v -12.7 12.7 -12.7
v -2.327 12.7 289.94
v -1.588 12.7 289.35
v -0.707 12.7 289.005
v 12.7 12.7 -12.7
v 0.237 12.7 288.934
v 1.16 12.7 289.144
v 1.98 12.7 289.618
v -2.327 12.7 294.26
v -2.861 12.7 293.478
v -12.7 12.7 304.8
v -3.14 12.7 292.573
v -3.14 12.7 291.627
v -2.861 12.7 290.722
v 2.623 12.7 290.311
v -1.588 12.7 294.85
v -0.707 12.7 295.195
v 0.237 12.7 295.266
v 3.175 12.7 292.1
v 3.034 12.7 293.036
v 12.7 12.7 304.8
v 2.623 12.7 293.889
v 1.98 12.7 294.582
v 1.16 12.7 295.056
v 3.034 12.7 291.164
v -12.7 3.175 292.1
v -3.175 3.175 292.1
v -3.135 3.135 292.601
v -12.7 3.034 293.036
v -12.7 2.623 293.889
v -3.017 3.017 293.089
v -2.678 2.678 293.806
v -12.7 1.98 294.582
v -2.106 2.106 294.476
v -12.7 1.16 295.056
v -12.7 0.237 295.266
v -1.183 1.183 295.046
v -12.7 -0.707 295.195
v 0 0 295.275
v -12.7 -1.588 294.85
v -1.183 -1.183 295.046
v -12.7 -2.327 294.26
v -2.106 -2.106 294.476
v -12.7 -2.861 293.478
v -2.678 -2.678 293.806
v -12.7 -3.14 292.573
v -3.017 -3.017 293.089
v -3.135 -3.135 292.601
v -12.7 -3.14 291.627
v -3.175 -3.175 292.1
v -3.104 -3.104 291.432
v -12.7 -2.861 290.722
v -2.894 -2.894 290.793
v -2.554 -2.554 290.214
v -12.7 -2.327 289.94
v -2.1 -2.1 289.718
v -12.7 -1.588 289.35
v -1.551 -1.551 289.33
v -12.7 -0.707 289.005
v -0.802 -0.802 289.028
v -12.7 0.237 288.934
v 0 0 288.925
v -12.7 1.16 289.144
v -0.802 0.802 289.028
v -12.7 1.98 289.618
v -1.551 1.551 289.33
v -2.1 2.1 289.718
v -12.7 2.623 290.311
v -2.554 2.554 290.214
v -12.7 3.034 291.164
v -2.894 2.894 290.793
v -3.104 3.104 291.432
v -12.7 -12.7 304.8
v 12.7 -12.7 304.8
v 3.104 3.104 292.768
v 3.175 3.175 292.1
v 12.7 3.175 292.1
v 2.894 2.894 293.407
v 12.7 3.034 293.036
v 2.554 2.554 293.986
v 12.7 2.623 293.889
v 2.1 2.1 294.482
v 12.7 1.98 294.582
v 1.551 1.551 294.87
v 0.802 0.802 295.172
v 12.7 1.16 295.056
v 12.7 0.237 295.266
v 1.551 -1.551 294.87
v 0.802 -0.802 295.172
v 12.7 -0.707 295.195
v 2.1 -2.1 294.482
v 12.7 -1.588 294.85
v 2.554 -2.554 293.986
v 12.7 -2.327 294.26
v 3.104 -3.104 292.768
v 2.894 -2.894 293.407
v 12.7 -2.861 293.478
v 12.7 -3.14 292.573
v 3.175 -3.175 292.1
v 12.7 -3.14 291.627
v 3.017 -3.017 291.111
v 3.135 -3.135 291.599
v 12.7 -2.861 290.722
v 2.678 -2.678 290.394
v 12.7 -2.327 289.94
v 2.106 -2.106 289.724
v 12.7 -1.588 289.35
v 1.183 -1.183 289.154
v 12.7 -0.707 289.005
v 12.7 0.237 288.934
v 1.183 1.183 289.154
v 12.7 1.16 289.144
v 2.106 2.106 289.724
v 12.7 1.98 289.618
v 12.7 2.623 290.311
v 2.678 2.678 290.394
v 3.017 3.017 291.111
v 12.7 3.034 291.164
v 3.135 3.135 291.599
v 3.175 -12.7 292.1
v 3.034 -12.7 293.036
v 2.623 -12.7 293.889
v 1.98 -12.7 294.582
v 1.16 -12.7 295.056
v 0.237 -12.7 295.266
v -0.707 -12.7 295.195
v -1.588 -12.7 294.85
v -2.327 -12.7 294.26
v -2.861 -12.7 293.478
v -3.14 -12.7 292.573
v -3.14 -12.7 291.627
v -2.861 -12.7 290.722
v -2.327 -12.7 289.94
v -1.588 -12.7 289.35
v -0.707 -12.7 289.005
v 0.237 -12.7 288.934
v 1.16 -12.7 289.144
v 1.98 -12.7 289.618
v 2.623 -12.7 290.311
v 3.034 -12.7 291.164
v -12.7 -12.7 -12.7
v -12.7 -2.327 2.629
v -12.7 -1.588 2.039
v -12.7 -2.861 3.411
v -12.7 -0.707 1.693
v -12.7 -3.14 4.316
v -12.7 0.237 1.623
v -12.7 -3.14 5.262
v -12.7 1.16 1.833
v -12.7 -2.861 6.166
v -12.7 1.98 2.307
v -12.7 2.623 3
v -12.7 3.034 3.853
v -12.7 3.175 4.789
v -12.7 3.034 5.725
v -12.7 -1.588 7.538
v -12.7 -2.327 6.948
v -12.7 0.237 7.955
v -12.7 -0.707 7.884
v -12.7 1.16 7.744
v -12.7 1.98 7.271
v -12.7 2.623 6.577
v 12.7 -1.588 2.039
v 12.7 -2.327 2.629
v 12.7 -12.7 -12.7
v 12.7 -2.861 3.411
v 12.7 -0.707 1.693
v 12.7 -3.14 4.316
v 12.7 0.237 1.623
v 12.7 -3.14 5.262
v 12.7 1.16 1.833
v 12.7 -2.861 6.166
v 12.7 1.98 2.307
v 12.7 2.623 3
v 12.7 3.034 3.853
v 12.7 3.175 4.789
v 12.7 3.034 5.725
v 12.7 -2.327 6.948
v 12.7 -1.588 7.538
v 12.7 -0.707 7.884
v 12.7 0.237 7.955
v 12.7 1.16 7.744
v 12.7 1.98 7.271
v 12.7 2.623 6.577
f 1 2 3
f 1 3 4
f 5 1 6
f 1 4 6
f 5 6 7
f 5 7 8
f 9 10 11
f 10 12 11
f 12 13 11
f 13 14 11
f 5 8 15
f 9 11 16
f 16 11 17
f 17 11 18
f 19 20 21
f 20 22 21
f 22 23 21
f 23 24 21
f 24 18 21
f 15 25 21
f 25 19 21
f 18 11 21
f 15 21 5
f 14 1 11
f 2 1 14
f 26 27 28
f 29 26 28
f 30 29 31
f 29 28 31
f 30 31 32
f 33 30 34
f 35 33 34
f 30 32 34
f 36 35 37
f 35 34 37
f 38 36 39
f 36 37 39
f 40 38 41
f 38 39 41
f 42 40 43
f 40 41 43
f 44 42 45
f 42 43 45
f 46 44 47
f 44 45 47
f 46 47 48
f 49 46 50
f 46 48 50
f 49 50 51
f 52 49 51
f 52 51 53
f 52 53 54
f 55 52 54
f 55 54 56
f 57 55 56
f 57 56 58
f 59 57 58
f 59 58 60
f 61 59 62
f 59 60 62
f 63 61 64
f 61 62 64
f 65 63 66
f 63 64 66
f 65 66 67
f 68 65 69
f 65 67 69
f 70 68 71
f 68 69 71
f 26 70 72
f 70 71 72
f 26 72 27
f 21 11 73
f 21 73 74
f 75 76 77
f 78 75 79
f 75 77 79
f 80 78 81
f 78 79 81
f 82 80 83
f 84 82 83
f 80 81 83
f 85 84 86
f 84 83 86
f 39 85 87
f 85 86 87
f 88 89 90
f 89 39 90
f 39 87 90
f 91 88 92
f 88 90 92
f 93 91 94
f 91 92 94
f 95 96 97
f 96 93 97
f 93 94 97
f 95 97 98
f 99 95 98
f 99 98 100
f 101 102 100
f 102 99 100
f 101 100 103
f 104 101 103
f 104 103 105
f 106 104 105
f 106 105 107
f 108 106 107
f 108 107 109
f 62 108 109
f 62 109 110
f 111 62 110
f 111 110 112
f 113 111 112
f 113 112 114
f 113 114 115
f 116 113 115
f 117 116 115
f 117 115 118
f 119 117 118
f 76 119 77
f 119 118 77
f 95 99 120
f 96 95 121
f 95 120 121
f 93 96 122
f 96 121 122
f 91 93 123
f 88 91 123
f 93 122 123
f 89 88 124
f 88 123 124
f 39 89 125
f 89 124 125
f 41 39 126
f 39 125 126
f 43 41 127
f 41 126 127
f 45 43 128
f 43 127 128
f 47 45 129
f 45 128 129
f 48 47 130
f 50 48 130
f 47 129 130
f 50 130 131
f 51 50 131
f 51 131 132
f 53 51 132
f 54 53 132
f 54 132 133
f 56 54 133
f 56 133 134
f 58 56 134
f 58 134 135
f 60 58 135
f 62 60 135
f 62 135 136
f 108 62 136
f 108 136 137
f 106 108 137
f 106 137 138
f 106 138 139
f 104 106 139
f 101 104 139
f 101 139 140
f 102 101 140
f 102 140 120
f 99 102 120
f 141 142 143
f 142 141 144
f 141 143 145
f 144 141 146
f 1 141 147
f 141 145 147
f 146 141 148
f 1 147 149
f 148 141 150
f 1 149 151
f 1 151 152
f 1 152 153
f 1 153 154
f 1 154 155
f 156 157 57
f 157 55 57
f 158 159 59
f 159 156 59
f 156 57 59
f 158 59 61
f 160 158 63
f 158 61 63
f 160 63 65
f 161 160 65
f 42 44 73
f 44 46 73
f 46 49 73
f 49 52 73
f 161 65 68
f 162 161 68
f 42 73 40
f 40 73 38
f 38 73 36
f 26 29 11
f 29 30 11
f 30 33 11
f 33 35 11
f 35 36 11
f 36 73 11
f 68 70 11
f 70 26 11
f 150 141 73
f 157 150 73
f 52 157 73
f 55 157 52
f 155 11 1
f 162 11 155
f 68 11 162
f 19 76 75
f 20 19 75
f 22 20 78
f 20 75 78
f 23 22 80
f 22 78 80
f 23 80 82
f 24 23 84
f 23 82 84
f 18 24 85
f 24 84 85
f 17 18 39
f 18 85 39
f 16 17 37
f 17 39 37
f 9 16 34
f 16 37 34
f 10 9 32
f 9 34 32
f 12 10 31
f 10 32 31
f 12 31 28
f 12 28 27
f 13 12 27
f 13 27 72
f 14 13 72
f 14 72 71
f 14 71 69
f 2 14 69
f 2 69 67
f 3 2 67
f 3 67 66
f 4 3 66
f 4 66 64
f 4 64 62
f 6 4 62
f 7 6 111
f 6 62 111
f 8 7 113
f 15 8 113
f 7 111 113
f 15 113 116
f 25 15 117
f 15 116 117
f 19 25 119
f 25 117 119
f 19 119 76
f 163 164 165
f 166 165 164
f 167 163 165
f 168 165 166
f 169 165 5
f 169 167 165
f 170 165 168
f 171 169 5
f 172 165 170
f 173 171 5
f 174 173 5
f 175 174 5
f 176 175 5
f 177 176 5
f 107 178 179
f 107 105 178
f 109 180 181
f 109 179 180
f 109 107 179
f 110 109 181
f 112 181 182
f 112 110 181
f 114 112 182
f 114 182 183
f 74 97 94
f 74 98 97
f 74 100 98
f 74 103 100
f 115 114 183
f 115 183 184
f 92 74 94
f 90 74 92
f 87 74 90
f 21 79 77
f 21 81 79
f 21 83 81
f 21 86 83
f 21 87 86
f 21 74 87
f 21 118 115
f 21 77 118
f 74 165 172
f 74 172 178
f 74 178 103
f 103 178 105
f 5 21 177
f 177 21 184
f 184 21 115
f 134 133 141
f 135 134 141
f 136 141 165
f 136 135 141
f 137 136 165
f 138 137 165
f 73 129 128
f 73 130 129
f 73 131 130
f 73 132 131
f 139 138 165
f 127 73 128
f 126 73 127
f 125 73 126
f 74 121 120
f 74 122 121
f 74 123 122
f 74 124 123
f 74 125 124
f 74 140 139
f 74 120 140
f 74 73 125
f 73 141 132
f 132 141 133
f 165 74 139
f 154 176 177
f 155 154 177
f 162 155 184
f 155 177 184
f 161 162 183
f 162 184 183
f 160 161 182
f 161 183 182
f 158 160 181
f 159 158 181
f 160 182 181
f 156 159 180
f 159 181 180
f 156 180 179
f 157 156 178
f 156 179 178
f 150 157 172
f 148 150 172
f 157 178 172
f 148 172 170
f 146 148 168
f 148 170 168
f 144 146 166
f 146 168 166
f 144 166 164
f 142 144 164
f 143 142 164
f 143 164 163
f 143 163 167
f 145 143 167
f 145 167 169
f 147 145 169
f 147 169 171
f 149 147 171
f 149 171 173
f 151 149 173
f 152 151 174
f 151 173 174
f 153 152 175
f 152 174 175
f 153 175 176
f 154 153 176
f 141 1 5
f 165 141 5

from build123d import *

# Parameters (mm, degrees)
F0_W     = 25.4
F0_H     = 25.4
F1_DEPTH = 304.8
F2_R     = 3.175
F3_DEPTH = 50.8
F4_R     = 3.175
F5_DEPTH = 25.4
F6_R     = 3.175
F7_DEPTH = 25.4
F8_DEPTH = 12.7


with BuildPart() as f1:
    # F0 (on Top) → F1 (new body)
    with BuildSketch(Plane.XY):
        Rectangle(F0_W, F0_H)
    extrude(amount=F1_DEPTH)

    # F2 (on face) → F3 (cut)
    with BuildSketch(Plane.XZ.offset(12.7)):
        with Locations((0, 292.1)):
            Circle(F2_R)
    extrude(amount=-F3_DEPTH, mode=Mode.SUBTRACT)

    # F4 (on face) → F5 (cut)
    with BuildSketch(Plane.YZ.offset(12.7)):
        with Locations((0, 292.1)):
            Circle(F4_R)
    extrude(amount=-F5_DEPTH, mode=Mode.SUBTRACT)

    # F6 (on face) → F7 (cut)
    with BuildSketch(Plane.YZ.offset(12.7)):
        with Locations((0, 4.7888585575)):
            Circle(F6_R)
    extrude(amount=-F7_DEPTH, mode=Mode.SUBTRACT)

    # F8 (add): a face of the model
    f8_faces = [f1.faces().sort_by_distance(p)[0] for p in [
        (0, 0, 0),
    ]]
    extrude(f8_faces, amount=F8_DEPTH)


solid = f1.part
